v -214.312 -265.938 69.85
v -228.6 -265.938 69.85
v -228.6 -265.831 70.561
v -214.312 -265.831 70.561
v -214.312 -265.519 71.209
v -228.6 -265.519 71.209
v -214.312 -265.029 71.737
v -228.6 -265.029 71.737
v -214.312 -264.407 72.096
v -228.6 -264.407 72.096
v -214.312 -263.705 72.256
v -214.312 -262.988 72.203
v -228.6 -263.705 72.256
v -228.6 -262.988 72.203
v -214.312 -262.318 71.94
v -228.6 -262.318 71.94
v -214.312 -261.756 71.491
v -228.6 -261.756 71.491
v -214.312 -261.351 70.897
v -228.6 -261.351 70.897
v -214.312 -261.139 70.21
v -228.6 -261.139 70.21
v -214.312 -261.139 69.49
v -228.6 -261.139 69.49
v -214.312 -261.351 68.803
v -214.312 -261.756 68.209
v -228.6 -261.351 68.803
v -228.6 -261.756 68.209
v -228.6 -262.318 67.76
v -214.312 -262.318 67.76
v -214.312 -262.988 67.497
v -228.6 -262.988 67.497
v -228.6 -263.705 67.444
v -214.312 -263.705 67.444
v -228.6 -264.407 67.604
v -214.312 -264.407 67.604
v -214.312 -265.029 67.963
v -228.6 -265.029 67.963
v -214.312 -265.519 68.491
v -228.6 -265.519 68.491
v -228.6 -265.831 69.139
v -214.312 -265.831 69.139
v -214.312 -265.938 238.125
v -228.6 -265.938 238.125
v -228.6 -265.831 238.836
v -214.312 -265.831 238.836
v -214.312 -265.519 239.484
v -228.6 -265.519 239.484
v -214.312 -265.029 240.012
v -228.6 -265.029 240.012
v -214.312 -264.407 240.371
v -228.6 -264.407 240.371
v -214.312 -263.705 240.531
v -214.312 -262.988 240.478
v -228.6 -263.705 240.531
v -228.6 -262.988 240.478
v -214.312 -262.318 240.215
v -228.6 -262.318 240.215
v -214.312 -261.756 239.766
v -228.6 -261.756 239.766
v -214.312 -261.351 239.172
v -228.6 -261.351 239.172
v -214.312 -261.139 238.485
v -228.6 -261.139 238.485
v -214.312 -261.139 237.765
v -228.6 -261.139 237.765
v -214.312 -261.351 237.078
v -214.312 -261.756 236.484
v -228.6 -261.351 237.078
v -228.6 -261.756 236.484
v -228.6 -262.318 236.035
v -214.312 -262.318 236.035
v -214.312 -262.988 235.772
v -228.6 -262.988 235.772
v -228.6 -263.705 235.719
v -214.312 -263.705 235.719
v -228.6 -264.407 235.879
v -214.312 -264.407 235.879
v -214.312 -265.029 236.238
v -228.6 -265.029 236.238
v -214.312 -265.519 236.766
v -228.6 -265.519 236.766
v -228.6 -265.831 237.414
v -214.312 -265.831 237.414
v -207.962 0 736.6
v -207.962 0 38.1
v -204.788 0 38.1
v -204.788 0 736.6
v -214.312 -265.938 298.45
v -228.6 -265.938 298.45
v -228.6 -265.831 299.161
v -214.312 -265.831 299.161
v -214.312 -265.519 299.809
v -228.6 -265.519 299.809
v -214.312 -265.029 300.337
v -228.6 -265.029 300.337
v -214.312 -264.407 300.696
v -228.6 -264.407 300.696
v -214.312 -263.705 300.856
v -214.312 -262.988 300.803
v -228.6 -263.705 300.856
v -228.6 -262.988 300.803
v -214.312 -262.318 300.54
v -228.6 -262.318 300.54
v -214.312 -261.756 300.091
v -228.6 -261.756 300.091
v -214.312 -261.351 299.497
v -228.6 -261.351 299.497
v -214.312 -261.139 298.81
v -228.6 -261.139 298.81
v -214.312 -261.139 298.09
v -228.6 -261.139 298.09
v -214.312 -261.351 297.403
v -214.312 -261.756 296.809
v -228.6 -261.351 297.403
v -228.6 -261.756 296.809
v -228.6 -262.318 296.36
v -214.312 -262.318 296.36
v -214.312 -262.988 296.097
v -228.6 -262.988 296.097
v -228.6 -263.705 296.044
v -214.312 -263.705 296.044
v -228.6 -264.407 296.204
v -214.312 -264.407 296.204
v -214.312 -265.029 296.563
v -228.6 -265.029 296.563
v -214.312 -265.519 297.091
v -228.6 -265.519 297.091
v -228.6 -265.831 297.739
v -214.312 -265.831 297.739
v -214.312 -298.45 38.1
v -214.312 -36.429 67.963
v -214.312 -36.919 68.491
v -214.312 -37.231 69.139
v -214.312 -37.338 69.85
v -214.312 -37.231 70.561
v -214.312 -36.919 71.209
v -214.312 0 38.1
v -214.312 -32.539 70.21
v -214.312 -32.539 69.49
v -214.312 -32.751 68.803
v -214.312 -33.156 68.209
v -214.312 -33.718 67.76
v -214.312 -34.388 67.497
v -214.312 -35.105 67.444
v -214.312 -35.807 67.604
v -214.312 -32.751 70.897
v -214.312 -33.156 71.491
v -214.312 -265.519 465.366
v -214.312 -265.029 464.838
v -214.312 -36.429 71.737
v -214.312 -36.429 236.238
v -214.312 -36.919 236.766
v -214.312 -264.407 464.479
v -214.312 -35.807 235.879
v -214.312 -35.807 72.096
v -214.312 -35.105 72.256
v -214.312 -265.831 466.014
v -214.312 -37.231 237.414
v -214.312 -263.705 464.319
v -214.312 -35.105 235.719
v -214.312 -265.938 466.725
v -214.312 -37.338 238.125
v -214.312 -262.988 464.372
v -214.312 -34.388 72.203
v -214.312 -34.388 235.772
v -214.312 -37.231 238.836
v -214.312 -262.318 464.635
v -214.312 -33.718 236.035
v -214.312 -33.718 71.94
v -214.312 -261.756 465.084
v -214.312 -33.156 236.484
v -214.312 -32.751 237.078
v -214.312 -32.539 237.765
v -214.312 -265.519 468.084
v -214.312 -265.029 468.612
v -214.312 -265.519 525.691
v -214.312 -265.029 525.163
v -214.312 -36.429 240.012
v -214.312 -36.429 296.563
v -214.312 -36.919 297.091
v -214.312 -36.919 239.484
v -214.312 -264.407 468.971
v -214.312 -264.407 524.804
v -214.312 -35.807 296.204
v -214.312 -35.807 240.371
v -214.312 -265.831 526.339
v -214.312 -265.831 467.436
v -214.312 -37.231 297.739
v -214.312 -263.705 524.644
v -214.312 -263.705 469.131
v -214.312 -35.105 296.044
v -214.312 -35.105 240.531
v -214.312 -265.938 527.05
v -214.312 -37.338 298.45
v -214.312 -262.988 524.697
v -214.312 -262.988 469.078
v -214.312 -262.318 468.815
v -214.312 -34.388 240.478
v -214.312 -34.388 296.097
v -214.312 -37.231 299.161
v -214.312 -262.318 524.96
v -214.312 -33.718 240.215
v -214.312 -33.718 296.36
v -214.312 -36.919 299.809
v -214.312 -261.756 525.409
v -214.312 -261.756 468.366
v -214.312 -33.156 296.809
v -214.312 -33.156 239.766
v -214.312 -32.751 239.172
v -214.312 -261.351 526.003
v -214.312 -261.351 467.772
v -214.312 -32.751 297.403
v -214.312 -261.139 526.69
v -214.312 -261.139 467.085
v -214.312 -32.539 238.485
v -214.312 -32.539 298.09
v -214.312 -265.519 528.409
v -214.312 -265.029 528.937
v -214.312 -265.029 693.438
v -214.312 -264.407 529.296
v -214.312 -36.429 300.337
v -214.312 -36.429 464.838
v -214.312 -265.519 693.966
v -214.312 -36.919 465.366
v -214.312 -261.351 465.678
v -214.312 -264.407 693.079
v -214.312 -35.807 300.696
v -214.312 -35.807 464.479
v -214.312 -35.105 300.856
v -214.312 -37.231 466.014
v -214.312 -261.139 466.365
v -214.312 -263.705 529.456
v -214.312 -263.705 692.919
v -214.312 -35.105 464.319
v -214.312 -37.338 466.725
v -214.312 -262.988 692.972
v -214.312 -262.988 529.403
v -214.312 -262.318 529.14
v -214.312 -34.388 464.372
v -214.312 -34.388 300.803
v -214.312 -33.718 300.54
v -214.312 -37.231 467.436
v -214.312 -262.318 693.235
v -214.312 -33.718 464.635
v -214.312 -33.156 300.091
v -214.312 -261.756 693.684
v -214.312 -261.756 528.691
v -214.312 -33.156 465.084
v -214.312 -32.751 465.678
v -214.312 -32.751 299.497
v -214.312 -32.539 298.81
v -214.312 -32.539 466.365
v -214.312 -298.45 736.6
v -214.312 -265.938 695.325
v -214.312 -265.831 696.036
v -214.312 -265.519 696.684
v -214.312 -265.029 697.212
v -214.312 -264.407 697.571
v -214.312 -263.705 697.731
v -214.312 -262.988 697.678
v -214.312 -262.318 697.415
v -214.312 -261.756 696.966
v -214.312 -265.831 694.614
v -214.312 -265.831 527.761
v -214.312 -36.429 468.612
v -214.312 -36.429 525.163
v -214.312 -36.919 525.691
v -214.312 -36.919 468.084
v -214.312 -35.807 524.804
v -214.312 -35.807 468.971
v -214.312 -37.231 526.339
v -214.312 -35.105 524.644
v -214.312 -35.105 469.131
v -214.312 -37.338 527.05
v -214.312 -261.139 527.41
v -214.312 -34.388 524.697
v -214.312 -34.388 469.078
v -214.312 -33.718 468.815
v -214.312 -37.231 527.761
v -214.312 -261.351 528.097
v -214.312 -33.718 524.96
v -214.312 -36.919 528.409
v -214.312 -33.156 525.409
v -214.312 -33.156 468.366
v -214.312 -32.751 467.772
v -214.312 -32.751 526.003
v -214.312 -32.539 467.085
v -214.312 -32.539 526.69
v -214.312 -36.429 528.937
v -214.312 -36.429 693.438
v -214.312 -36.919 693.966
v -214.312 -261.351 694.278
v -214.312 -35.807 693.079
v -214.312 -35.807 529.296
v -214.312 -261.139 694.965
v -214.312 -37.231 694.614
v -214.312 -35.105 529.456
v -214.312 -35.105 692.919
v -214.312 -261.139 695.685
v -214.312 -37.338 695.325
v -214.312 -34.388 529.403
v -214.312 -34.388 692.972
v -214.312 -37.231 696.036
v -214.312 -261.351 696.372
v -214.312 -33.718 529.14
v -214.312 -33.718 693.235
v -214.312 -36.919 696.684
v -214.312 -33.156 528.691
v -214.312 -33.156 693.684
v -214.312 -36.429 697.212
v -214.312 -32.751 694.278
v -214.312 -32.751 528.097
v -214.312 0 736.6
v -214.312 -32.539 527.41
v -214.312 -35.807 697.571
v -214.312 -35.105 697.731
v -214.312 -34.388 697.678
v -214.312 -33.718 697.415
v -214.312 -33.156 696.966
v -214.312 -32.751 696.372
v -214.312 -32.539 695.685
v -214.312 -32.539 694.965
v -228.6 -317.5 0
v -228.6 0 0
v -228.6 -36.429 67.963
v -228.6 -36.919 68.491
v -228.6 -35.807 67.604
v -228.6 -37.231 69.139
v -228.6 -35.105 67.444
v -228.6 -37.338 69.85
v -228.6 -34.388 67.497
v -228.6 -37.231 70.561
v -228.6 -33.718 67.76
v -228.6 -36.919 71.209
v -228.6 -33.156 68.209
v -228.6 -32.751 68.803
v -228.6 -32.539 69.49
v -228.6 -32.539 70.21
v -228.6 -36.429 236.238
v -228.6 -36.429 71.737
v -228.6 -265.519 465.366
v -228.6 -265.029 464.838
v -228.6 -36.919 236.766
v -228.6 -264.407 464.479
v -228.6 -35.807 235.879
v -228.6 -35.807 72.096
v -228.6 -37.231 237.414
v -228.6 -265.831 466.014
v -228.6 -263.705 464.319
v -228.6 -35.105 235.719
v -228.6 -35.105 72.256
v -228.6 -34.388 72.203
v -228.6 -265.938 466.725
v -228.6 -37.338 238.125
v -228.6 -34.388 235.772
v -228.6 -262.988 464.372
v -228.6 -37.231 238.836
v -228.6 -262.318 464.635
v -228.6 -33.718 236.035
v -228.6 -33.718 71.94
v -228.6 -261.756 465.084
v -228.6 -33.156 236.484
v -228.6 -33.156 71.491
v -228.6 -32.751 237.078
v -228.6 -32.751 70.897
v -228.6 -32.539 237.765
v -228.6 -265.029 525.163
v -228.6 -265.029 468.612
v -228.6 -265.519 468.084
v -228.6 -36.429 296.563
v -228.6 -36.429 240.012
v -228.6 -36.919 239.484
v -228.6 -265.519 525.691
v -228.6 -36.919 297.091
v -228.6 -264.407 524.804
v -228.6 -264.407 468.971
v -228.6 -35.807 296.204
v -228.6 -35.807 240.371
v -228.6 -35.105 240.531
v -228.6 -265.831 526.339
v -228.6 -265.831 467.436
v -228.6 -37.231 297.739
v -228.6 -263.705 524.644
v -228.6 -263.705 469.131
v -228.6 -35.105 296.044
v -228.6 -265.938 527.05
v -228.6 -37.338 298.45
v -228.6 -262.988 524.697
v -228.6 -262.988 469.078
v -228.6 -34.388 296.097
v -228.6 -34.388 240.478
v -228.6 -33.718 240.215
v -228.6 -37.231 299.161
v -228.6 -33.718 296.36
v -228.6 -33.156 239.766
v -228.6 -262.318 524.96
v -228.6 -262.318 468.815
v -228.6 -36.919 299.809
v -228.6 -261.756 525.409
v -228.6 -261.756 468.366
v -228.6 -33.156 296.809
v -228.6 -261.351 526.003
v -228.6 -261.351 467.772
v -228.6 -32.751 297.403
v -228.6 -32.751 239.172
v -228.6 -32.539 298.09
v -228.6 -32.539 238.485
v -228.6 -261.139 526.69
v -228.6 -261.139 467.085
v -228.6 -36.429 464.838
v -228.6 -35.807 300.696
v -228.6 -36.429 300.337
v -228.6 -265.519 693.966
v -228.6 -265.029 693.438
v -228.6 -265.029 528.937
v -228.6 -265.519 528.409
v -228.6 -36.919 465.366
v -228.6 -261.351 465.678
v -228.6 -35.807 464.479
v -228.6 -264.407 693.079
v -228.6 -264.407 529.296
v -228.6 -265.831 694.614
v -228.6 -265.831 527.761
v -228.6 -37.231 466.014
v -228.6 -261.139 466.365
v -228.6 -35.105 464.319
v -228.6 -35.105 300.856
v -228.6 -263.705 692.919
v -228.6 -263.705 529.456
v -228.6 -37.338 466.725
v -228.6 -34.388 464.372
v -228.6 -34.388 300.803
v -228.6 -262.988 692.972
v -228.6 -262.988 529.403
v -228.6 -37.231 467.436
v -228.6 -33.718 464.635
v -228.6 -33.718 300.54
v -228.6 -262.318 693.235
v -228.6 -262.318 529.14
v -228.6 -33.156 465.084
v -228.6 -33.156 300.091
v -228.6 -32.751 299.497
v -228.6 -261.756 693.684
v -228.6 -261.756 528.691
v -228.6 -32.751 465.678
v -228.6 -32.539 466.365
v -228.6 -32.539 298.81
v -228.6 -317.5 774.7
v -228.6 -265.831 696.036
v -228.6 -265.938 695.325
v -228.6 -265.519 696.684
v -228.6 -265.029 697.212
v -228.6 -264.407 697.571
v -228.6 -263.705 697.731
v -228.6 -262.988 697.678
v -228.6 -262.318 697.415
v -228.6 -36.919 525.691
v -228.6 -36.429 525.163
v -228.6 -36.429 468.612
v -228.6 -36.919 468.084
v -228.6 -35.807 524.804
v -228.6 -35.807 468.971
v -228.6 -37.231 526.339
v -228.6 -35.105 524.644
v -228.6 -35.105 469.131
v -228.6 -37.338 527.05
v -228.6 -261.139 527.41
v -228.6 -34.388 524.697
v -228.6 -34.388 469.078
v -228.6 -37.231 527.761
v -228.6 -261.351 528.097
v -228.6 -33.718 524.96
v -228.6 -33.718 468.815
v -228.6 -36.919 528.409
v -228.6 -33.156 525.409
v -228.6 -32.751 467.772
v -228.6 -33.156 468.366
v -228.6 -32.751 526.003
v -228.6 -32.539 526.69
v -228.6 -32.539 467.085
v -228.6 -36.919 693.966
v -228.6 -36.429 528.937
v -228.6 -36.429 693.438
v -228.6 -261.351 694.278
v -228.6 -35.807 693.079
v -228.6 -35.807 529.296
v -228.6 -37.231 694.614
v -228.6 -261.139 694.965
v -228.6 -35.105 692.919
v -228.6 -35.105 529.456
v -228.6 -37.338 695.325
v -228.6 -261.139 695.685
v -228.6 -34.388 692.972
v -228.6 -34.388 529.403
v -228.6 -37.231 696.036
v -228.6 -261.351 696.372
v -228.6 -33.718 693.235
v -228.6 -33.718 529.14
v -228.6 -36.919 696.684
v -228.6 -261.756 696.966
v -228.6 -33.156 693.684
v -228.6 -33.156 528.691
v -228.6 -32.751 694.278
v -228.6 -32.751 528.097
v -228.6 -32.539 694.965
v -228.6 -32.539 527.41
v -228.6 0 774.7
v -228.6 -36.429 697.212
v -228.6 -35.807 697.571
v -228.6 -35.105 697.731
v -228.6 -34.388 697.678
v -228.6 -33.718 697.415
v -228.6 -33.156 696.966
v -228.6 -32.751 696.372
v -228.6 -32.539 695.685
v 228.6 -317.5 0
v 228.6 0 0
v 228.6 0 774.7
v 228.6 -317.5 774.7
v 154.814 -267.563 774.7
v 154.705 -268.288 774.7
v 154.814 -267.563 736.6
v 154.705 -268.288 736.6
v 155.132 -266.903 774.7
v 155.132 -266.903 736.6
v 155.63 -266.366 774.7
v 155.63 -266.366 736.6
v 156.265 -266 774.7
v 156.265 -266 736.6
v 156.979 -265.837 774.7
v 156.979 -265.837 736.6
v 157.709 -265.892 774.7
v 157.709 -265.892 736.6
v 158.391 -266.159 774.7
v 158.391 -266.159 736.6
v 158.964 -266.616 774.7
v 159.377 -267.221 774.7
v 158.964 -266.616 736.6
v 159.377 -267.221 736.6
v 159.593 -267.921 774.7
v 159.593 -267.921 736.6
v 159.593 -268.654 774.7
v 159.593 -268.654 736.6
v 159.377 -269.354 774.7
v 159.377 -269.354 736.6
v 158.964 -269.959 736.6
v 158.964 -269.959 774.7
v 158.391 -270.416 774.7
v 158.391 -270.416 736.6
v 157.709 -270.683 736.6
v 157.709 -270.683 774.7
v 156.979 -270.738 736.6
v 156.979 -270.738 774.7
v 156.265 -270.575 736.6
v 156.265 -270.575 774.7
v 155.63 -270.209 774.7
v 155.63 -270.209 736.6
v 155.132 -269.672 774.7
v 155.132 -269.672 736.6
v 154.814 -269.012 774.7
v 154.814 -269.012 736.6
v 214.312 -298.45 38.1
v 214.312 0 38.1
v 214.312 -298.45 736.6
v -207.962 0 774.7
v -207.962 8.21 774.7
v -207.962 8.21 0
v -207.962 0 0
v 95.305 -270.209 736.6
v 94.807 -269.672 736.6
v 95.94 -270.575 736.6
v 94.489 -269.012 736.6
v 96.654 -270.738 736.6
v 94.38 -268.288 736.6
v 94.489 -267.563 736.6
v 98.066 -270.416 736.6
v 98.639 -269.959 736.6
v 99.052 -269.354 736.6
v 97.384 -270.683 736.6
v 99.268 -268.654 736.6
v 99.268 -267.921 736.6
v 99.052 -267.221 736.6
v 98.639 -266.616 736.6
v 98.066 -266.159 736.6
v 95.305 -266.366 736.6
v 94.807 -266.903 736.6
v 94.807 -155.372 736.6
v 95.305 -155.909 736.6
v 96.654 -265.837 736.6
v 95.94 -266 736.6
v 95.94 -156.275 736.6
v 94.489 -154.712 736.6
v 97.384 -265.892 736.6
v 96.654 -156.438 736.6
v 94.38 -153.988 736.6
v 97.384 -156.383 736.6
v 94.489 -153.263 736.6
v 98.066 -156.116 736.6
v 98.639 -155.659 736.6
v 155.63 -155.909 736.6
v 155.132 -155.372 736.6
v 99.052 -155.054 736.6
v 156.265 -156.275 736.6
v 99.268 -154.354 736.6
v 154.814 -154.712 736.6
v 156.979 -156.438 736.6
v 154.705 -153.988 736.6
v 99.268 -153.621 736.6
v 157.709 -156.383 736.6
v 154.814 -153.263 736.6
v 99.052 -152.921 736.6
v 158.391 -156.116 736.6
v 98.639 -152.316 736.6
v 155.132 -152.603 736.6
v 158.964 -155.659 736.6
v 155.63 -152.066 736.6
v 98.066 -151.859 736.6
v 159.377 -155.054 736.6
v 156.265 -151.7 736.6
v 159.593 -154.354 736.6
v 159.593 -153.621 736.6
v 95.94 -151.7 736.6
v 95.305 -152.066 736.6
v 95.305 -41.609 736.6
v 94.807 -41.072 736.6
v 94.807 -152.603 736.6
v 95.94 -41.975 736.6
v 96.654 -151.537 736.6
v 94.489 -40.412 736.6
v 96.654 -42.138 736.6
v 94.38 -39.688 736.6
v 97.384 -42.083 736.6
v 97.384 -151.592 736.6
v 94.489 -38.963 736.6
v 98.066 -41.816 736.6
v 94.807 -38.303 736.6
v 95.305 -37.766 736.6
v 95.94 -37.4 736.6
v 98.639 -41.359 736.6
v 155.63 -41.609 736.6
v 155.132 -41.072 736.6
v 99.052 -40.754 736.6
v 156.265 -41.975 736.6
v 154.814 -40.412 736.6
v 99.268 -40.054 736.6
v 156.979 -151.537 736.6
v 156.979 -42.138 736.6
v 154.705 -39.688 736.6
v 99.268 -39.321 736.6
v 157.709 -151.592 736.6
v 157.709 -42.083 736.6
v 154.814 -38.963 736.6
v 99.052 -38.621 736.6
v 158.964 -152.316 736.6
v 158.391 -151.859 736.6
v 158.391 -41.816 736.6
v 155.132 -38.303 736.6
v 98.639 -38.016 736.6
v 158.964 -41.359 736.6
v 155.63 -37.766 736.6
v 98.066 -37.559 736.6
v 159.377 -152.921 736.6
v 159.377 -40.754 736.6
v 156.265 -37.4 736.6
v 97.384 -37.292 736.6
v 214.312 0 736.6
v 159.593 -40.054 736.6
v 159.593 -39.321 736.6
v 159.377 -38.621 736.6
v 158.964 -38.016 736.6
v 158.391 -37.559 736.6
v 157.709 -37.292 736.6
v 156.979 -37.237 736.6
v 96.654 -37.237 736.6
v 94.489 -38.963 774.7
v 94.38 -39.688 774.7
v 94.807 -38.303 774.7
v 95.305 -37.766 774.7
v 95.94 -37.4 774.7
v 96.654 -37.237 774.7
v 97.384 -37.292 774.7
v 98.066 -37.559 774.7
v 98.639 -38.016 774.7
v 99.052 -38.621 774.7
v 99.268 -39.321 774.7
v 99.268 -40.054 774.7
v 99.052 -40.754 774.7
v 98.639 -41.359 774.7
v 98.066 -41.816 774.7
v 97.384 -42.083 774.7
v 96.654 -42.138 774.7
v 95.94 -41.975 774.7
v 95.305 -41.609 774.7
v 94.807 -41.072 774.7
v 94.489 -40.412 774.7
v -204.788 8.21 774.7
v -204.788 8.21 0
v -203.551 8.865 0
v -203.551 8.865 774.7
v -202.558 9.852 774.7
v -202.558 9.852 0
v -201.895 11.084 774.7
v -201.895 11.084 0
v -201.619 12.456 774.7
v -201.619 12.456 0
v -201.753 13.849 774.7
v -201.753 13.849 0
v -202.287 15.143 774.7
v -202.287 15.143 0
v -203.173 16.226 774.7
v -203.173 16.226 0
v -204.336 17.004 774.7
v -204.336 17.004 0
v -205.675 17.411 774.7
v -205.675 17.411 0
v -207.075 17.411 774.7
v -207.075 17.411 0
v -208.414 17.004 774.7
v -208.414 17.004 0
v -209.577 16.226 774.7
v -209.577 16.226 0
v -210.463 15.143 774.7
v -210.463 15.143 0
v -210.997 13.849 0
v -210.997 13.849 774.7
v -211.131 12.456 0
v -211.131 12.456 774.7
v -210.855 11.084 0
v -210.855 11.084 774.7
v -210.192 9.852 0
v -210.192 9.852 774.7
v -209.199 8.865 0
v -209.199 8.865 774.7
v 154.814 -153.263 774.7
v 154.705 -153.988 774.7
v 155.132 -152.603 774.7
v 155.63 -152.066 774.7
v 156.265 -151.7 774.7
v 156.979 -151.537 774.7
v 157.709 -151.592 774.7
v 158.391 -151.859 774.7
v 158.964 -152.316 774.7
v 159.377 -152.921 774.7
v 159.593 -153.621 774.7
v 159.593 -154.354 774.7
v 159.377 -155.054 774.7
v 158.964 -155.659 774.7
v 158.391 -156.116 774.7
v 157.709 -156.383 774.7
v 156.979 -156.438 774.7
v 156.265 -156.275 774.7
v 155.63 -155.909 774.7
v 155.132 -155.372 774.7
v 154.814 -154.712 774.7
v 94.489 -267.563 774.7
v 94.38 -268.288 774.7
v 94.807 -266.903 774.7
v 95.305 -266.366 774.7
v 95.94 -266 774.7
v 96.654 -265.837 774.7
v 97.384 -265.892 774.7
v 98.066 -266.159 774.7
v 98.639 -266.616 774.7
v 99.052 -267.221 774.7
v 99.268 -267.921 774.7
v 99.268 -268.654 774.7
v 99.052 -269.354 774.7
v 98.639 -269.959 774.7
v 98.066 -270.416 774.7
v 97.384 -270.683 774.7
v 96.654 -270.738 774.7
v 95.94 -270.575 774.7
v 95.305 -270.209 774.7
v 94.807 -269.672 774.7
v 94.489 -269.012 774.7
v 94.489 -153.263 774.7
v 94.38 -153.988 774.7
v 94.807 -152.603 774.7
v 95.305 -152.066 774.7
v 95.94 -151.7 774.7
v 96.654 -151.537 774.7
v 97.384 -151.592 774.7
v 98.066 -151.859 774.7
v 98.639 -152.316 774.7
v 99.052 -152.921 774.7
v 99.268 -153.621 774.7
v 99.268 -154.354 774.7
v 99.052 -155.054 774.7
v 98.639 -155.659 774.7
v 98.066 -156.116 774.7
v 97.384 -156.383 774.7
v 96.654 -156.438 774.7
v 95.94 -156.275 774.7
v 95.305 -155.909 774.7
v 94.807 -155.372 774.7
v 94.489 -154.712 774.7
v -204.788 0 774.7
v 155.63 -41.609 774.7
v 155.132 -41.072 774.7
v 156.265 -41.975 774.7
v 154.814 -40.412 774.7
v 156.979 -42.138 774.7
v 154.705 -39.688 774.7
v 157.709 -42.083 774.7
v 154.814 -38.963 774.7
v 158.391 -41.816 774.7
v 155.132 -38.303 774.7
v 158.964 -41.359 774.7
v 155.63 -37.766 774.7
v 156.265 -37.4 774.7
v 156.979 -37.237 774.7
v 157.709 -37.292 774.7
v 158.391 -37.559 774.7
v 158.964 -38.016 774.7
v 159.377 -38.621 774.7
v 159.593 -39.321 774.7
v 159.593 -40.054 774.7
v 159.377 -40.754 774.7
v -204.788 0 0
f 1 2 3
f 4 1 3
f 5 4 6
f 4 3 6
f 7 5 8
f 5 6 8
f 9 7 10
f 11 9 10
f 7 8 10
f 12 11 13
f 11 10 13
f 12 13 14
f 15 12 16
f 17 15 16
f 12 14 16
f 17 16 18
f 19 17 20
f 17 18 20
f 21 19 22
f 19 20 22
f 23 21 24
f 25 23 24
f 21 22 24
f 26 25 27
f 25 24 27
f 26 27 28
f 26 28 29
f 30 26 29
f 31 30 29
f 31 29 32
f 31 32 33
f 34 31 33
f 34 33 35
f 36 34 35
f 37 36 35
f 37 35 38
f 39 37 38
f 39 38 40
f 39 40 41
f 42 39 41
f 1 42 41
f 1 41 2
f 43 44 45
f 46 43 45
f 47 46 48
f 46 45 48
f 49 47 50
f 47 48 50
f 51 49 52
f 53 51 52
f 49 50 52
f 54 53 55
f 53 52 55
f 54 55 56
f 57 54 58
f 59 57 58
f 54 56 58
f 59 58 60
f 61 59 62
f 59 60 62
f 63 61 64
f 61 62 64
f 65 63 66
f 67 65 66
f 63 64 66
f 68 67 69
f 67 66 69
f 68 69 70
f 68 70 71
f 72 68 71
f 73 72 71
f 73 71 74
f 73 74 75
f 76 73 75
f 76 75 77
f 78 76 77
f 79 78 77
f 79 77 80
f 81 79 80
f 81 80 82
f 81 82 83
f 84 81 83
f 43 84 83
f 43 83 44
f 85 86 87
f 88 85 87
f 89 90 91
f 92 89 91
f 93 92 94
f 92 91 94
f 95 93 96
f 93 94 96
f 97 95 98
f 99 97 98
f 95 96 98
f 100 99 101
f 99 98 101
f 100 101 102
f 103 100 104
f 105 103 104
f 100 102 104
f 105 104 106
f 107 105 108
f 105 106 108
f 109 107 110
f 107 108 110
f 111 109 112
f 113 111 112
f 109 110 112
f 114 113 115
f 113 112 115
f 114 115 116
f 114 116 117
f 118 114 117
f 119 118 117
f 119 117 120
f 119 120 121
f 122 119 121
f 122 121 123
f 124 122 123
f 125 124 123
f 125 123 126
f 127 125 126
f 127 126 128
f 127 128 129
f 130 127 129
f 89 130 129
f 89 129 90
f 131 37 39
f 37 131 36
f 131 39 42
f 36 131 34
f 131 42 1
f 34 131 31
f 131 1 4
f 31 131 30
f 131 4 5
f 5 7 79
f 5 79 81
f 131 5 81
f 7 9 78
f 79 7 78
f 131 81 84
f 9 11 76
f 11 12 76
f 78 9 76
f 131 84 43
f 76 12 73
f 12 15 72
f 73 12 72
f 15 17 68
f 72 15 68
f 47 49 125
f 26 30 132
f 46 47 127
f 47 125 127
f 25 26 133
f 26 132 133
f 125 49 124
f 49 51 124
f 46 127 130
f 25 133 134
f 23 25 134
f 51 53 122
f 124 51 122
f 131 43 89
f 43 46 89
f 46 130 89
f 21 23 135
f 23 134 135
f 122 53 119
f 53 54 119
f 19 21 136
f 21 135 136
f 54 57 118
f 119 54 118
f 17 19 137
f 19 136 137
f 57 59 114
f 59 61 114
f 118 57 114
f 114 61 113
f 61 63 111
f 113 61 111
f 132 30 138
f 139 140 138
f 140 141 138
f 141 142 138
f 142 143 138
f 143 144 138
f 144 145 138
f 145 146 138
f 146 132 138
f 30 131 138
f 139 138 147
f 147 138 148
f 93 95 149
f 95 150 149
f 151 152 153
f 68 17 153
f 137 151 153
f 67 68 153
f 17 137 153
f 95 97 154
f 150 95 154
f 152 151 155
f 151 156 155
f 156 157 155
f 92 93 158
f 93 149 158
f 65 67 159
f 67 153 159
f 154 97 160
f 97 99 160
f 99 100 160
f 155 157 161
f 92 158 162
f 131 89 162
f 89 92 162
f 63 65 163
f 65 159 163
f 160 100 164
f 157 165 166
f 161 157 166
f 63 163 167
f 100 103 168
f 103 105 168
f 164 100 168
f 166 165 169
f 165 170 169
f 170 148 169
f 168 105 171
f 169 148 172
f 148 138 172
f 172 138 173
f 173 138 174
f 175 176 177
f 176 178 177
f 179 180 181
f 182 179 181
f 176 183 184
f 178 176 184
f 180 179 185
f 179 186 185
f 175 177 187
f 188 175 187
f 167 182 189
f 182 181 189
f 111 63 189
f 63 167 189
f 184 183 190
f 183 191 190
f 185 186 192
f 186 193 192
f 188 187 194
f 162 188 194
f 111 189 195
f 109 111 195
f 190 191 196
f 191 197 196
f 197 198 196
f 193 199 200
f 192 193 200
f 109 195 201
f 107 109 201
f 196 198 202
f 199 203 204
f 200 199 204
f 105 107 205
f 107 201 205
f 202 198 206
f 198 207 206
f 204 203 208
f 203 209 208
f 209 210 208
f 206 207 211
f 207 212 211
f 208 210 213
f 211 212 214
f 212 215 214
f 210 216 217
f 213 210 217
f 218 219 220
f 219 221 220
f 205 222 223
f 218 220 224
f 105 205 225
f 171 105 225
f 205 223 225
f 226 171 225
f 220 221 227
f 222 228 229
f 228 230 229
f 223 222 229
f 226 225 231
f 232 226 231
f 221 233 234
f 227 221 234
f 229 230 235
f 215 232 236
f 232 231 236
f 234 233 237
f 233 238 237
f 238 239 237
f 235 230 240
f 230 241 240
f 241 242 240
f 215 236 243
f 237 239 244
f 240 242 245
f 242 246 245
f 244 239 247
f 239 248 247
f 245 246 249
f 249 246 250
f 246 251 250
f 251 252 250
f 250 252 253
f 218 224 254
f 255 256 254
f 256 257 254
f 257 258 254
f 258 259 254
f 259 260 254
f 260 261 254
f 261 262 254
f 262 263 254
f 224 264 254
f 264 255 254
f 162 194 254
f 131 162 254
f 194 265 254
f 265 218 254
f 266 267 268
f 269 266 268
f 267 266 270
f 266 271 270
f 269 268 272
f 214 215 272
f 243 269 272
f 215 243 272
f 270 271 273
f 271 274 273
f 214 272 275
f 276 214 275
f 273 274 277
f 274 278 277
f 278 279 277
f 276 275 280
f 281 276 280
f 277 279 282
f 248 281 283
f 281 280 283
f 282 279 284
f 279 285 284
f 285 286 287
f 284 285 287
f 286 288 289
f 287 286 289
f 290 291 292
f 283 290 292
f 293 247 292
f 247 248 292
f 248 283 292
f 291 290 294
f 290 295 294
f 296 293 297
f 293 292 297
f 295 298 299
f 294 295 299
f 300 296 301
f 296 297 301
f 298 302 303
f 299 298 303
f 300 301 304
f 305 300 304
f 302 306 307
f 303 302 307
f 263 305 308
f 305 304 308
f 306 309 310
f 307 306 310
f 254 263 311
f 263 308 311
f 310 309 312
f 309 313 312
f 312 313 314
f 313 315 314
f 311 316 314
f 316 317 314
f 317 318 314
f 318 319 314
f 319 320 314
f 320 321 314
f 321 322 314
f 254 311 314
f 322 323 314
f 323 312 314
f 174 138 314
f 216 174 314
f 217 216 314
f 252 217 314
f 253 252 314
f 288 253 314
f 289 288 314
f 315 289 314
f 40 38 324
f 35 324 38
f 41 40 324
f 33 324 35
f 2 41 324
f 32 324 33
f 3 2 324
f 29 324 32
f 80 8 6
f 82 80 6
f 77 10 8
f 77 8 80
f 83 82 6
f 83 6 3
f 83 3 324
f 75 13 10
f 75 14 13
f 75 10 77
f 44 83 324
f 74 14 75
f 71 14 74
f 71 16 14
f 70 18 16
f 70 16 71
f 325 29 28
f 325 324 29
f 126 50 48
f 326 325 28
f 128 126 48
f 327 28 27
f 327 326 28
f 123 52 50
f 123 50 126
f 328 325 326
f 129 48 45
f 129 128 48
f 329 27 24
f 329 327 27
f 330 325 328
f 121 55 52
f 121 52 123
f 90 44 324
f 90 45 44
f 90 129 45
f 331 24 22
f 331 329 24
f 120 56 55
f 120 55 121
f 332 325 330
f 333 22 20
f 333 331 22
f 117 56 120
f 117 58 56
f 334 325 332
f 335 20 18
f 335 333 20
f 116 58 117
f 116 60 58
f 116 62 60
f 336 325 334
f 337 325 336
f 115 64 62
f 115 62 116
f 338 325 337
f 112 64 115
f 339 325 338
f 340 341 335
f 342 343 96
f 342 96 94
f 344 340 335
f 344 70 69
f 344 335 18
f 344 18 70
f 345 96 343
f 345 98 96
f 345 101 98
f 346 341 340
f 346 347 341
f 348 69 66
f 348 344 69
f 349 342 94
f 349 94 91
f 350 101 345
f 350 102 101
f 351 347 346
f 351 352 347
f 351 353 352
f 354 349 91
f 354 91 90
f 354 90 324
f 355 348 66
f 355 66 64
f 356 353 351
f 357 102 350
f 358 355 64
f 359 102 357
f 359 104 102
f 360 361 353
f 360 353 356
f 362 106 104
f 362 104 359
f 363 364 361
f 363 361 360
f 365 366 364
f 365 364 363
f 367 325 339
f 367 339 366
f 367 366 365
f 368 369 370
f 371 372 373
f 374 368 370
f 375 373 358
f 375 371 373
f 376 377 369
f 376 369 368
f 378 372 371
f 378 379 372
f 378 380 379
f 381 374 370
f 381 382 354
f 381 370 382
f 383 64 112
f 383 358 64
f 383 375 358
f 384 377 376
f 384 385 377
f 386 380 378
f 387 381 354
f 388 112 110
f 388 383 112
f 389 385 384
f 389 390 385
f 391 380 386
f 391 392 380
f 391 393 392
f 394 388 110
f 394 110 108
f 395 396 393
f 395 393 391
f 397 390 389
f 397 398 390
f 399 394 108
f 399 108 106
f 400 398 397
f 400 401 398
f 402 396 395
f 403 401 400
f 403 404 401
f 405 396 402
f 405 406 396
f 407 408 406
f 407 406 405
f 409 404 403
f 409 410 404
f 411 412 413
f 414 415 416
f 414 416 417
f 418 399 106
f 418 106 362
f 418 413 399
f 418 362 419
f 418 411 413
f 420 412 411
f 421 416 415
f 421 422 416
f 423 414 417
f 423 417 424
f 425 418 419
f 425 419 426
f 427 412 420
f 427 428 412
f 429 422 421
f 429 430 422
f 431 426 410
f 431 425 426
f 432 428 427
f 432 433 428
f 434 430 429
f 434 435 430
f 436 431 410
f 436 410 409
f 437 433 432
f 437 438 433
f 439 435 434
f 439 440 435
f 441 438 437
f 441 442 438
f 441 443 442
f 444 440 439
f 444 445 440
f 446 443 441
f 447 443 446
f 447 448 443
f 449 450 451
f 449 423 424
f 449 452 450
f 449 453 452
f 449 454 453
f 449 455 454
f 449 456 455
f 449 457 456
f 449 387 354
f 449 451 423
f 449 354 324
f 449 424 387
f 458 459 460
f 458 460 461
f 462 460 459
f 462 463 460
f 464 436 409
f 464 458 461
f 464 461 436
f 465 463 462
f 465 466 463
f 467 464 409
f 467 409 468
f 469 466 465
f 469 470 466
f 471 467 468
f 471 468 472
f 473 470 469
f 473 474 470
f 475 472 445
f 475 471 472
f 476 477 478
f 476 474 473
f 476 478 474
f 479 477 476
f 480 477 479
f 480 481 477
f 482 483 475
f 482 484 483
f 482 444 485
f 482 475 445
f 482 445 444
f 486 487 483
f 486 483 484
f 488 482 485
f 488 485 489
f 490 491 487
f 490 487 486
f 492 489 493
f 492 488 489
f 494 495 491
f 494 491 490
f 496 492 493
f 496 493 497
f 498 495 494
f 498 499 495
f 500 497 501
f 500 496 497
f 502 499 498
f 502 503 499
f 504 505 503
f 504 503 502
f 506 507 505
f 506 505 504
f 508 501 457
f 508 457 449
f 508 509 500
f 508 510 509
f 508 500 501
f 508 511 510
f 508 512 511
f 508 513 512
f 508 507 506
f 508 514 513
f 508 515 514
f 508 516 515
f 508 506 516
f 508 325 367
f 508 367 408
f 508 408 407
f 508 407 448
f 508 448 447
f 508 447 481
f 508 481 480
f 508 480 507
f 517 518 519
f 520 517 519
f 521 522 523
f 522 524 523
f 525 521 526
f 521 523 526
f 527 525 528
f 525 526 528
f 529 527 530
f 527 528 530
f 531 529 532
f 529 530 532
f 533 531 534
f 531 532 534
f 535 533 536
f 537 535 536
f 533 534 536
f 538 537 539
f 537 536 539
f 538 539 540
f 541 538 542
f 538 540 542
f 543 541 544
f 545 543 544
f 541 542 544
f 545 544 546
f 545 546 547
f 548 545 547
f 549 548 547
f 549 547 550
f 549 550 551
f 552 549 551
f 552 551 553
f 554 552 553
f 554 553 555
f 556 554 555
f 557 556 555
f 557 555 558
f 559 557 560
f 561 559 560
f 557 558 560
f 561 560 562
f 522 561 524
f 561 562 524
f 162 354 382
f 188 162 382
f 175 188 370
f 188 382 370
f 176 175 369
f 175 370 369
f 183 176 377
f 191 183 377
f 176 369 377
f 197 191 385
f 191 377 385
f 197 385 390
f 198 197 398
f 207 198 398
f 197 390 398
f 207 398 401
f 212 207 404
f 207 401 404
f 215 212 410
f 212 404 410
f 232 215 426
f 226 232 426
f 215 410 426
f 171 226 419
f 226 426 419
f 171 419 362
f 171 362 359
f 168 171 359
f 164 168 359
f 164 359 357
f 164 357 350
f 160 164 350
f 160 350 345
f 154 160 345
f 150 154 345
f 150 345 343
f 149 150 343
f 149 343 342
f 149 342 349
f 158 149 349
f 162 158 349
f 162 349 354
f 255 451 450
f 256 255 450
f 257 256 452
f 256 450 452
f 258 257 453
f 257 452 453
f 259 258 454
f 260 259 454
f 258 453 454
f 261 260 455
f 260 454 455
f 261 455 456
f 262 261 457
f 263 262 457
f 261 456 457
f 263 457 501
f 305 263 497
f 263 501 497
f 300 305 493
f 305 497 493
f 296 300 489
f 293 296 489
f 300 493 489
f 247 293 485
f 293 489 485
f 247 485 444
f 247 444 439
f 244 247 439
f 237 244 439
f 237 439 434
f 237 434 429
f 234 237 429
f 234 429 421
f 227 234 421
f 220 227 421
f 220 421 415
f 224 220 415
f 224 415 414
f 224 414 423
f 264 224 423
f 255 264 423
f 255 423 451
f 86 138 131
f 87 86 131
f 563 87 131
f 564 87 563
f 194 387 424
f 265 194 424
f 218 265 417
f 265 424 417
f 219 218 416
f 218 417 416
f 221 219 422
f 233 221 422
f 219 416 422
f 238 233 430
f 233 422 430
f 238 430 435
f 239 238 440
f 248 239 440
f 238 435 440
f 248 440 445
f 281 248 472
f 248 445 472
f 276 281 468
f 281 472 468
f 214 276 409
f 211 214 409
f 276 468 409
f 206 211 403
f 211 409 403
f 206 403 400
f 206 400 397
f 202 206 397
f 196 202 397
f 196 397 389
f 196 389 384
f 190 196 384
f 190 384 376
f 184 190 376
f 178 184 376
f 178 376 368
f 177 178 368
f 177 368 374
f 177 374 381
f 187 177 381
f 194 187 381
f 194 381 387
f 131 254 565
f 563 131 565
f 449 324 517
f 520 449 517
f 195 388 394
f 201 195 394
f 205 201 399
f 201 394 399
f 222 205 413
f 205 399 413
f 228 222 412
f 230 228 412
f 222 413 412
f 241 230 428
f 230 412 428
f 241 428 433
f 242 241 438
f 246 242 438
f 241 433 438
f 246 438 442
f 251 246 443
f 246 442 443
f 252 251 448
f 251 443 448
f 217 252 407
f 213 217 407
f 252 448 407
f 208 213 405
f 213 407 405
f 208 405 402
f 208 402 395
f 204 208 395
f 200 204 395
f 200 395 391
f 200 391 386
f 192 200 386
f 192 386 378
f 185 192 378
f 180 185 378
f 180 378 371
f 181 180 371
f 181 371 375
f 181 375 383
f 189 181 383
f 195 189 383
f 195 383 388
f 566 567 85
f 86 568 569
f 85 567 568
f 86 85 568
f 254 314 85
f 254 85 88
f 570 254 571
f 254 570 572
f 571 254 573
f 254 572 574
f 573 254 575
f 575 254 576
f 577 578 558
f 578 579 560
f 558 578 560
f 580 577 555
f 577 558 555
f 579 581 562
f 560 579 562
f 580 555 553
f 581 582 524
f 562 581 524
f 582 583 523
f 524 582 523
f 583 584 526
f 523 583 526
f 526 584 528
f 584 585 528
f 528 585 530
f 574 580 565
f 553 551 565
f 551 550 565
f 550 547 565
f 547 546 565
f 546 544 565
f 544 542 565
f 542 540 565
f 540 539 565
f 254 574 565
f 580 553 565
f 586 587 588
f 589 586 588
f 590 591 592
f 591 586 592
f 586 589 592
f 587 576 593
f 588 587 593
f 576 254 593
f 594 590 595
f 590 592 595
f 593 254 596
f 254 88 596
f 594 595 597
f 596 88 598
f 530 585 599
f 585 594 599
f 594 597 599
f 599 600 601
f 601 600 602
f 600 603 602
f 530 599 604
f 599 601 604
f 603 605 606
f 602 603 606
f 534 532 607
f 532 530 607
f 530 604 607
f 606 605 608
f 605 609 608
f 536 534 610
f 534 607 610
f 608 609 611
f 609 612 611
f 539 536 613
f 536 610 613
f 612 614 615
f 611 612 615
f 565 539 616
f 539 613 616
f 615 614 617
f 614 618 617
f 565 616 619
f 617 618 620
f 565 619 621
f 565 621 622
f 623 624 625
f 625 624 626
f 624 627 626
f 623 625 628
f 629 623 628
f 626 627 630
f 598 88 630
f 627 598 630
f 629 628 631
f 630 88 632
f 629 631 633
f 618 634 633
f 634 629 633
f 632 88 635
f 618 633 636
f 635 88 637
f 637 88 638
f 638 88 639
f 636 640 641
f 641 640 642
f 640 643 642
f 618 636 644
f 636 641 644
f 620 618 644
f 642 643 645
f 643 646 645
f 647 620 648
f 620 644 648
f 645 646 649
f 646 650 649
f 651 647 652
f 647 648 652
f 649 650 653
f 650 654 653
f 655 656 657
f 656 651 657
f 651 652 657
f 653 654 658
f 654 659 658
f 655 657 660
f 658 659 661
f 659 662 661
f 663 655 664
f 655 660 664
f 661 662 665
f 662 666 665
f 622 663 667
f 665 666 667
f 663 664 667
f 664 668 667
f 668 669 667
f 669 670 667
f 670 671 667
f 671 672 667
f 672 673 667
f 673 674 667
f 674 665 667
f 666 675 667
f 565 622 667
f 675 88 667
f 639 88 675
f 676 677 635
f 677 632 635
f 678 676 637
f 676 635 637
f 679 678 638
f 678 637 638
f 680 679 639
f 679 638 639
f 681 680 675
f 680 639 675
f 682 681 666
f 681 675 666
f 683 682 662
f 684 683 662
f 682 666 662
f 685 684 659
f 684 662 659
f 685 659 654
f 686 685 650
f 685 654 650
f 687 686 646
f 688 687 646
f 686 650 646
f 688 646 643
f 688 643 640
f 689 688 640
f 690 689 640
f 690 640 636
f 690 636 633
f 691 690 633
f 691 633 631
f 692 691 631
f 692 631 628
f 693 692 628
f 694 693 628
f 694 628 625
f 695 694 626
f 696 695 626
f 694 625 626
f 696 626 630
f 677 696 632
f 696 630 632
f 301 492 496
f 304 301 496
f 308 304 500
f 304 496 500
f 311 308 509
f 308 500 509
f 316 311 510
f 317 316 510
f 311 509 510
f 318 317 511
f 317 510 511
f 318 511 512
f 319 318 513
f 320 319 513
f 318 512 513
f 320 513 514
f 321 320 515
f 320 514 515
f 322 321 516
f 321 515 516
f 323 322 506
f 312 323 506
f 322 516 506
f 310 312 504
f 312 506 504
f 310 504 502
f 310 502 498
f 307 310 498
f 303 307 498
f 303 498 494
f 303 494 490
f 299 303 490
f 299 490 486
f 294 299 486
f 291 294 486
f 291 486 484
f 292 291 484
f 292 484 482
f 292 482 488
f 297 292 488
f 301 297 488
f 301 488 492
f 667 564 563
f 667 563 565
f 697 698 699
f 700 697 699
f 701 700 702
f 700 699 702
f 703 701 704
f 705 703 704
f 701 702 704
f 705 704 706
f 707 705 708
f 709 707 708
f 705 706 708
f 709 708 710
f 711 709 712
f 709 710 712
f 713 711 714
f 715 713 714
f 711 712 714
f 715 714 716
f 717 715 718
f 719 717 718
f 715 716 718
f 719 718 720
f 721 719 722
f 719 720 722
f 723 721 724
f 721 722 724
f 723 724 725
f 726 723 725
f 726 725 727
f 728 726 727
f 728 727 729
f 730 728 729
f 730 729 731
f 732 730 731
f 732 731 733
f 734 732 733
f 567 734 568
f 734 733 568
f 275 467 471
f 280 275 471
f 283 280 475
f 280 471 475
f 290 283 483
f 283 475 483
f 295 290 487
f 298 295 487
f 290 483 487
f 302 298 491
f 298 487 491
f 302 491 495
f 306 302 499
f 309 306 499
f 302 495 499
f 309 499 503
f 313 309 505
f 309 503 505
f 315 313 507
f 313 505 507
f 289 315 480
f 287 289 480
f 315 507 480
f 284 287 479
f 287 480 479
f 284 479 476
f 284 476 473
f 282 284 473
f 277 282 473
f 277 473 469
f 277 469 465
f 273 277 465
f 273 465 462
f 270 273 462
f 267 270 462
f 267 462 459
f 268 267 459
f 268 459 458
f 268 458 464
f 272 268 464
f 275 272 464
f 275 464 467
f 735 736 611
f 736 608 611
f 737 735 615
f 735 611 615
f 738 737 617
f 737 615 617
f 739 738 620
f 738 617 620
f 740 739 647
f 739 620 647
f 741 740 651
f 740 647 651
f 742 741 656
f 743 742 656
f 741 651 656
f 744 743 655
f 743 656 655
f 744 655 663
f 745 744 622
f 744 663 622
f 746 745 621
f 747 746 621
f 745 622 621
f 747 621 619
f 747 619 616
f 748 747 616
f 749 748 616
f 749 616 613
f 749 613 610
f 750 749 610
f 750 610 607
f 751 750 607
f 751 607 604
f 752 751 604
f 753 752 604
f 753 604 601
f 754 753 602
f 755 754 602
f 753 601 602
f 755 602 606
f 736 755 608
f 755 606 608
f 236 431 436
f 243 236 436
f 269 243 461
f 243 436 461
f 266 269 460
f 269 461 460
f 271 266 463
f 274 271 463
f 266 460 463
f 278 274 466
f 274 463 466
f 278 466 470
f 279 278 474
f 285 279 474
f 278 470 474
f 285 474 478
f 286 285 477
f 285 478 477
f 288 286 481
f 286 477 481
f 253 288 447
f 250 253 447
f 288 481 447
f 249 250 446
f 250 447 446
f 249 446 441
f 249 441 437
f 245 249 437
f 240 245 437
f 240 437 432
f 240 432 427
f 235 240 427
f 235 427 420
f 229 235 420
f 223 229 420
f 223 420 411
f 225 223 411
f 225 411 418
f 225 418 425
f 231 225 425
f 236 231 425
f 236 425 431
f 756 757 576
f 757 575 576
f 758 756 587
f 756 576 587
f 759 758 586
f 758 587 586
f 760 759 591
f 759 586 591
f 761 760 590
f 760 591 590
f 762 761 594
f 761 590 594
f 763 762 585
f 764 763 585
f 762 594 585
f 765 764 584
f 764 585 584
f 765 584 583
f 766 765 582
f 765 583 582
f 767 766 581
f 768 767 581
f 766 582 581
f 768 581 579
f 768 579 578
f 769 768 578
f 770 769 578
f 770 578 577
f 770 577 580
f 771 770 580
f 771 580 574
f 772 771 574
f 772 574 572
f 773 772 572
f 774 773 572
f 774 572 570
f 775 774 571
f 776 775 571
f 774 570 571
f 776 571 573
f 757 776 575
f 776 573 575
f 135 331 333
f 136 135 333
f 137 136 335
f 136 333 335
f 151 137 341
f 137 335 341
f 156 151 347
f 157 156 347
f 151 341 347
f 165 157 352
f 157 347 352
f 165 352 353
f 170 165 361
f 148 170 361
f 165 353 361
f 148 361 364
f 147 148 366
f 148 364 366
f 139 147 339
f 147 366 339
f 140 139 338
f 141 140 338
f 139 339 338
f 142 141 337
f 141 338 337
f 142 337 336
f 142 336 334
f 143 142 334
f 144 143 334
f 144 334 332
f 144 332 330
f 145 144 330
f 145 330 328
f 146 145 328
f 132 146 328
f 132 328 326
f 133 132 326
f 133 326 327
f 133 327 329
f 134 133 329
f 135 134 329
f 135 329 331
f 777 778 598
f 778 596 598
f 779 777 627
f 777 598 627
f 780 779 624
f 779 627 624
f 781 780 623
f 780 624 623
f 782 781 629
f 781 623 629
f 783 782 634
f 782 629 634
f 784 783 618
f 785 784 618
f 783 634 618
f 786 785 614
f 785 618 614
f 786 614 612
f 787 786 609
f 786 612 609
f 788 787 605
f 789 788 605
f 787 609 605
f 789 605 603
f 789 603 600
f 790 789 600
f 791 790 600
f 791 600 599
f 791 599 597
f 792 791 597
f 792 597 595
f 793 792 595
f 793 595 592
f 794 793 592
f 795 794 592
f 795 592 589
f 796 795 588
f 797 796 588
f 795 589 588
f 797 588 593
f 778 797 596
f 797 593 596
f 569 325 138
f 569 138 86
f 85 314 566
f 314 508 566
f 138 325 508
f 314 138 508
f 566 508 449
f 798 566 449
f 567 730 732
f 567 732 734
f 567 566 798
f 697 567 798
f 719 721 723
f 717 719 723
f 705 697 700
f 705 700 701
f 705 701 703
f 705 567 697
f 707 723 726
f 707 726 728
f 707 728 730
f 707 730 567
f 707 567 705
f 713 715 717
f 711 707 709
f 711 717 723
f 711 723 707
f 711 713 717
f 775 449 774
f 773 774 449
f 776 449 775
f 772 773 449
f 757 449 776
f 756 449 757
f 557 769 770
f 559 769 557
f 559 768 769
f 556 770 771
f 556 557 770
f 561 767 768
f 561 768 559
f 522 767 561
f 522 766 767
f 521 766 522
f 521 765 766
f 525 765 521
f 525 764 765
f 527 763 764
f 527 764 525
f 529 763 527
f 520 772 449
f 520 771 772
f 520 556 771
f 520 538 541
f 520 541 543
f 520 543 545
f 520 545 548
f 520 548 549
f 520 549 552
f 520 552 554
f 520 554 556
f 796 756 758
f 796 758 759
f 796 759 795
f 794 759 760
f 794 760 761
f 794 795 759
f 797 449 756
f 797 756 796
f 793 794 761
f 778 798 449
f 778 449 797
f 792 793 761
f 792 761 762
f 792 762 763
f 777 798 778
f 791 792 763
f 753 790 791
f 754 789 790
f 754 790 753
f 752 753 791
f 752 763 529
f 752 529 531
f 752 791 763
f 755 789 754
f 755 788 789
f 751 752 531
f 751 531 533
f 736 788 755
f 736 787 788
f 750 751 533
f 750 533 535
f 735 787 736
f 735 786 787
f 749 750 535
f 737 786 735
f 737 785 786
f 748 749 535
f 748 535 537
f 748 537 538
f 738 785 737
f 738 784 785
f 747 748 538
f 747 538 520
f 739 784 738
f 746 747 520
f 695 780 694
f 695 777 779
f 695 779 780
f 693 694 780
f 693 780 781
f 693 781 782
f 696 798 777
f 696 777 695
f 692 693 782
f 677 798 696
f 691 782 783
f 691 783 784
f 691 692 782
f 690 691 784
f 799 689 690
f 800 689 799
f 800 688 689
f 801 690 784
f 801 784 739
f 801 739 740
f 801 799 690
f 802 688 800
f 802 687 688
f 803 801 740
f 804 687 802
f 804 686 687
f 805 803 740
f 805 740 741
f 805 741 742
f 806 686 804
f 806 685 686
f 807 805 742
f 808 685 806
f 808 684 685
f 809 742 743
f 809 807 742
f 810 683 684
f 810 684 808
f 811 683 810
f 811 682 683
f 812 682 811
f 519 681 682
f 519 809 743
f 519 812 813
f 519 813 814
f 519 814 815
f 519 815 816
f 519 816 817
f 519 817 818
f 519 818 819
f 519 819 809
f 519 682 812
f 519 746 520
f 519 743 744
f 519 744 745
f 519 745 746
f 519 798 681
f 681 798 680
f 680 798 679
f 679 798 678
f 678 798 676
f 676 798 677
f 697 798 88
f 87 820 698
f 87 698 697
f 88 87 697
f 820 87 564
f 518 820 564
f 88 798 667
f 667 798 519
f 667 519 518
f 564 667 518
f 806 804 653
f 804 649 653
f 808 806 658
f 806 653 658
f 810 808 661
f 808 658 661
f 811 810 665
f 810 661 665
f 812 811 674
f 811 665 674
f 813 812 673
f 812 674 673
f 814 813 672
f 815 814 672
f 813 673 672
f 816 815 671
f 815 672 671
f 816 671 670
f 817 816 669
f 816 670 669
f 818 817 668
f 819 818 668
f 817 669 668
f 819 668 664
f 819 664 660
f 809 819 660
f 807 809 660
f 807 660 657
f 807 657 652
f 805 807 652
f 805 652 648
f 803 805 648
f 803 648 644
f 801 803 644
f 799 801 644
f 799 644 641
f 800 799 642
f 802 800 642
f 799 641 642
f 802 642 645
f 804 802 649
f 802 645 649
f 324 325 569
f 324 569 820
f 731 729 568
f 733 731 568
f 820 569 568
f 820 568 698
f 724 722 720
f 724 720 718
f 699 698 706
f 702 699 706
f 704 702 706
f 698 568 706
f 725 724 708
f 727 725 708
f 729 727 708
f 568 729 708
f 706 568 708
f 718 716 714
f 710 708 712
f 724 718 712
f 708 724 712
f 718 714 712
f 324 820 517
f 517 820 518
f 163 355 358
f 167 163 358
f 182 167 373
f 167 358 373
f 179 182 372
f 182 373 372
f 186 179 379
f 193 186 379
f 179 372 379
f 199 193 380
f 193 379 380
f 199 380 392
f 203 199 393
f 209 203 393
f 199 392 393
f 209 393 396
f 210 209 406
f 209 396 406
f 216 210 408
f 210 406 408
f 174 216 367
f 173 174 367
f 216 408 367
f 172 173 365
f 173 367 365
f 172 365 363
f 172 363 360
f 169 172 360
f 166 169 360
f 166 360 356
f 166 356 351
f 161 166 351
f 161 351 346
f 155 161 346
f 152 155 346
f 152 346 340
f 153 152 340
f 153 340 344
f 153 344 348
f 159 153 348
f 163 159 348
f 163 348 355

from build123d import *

# Parameters (mm, degrees)
F0_W      = 457.2
F0_H      = 774.7
F1_DEPTH  = 317.5
F2_W      = 381
F2_H      = 698.5
F3_W      = 428.625
F3_H      = 698.5
F4_DEPTH  = 298.45
F5_START  = 19.05
F5_DEPTH  = 279.4
F7_DEPTH  = 774.7
F9_D      = 4.9149
F9_DEPTH  = 38.1
F9_TIP    = 1.4765849282
F10_R     = 2.413
F11_DEPTH = 25.4


# Not quite as in the source:
# - a feature names something its author has since deleted; it is built from what else it names


with BuildPart() as f1:
    # F0 (on Front) → F1 (new body)
    with BuildSketch(Plane.XZ):
        with Locations((0, 387.35)):
            Rectangle(F0_W, F0_H)
    extrude(amount=F1_DEPTH)

    # F2 (on Front) + F3 (on Front) → F4 (cut)
    with BuildSketch(Plane.XZ):
        with Locations((0, 387.35)):
            Rectangle(F2_W, F2_H)
    with BuildSketch(Plane.XZ):
        with Locations((0, 387.35)):
            Rectangle(F3_W, F3_H)
    extrude(amount=F4_DEPTH, mode=Mode.SUBTRACT)

    # F3 (on Front) → F5 (cut)
    with BuildSketch(Plane.XZ.offset(F5_START)):
        with Locations((0, 387.35)):
            Rectangle(F3_W, F3_H)
    extrude(amount=F5_DEPTH, mode=Mode.SUBTRACT)

    # F6 (on Top) → F7 (join, through all)
    with BuildSketch(Plane.XY):
        with BuildLine():
            Line((-204.7875, 0), (-204.7875, 8.2098719395))
            ThreePointArc((-204.7875, 8.2098719395), (-206.375, 17.4625), (-207.9625, 8.2098719395))
            Line((-207.9625, 8.2098719395), (-207.9625, 0))
            Line((-207.9625, 0), (-204.7875, 0))
        make_face()
    extrude(amount=F7_DEPTH)

    # F9
    with Locations(Plane.XY.offset(774.7)):
        with Locations((96.8375, -153.9875), (157.1625, -39.6875), (157.1625, -153.9875), (96.8375, -268.2875), (96.8375, -39.6875), (157.1625, -268.2875)):
            Hole(F9_D / 2, depth=F9_DEPTH)
            with Locations((0, 0, -(F9_DEPTH + F9_TIP / 2))):  # 118° drill point
                Cone(0, F9_D / 2, F9_TIP, mode=Mode.SUBTRACT)

    # F10 (on face) → F11 (cut)
    with BuildSketch(Plane(origin=(-228.6, 0, 0), x_dir=(0, -1, 0), z_dir=(-1, 0, 0))):
        with Locations((34.925, 695.325)):
            Circle(F10_R)
        with Locations((34.925, 527.05)):
            Circle(F10_R)
        with Locations((34.925, 466.725)):
            Circle(F10_R)
        with Locations((34.925, 298.45)):
            Circle(F10_R)
        with Locations((34.925, 238.125)):
            Circle(F10_R)
        with Locations((34.925, 69.85)):
            Circle(F10_R)
        with Locations((263.525, 69.85)):
            Circle(F10_R)
        with Locations((263.525, 238.125)):
            Circle(F10_R)
        with Locations((263.525, 298.45)):
            Circle(F10_R)
        with Locations((263.525, 466.725)):
            Circle(F10_R)
        with Locations((263.525, 527.05)):
            Circle(F10_R)
        with Locations((263.525, 695.325)):
            Circle(F10_R)
    extrude(amount=-F11_DEPTH, mode=Mode.SUBTRACT)


solid = f1.part
